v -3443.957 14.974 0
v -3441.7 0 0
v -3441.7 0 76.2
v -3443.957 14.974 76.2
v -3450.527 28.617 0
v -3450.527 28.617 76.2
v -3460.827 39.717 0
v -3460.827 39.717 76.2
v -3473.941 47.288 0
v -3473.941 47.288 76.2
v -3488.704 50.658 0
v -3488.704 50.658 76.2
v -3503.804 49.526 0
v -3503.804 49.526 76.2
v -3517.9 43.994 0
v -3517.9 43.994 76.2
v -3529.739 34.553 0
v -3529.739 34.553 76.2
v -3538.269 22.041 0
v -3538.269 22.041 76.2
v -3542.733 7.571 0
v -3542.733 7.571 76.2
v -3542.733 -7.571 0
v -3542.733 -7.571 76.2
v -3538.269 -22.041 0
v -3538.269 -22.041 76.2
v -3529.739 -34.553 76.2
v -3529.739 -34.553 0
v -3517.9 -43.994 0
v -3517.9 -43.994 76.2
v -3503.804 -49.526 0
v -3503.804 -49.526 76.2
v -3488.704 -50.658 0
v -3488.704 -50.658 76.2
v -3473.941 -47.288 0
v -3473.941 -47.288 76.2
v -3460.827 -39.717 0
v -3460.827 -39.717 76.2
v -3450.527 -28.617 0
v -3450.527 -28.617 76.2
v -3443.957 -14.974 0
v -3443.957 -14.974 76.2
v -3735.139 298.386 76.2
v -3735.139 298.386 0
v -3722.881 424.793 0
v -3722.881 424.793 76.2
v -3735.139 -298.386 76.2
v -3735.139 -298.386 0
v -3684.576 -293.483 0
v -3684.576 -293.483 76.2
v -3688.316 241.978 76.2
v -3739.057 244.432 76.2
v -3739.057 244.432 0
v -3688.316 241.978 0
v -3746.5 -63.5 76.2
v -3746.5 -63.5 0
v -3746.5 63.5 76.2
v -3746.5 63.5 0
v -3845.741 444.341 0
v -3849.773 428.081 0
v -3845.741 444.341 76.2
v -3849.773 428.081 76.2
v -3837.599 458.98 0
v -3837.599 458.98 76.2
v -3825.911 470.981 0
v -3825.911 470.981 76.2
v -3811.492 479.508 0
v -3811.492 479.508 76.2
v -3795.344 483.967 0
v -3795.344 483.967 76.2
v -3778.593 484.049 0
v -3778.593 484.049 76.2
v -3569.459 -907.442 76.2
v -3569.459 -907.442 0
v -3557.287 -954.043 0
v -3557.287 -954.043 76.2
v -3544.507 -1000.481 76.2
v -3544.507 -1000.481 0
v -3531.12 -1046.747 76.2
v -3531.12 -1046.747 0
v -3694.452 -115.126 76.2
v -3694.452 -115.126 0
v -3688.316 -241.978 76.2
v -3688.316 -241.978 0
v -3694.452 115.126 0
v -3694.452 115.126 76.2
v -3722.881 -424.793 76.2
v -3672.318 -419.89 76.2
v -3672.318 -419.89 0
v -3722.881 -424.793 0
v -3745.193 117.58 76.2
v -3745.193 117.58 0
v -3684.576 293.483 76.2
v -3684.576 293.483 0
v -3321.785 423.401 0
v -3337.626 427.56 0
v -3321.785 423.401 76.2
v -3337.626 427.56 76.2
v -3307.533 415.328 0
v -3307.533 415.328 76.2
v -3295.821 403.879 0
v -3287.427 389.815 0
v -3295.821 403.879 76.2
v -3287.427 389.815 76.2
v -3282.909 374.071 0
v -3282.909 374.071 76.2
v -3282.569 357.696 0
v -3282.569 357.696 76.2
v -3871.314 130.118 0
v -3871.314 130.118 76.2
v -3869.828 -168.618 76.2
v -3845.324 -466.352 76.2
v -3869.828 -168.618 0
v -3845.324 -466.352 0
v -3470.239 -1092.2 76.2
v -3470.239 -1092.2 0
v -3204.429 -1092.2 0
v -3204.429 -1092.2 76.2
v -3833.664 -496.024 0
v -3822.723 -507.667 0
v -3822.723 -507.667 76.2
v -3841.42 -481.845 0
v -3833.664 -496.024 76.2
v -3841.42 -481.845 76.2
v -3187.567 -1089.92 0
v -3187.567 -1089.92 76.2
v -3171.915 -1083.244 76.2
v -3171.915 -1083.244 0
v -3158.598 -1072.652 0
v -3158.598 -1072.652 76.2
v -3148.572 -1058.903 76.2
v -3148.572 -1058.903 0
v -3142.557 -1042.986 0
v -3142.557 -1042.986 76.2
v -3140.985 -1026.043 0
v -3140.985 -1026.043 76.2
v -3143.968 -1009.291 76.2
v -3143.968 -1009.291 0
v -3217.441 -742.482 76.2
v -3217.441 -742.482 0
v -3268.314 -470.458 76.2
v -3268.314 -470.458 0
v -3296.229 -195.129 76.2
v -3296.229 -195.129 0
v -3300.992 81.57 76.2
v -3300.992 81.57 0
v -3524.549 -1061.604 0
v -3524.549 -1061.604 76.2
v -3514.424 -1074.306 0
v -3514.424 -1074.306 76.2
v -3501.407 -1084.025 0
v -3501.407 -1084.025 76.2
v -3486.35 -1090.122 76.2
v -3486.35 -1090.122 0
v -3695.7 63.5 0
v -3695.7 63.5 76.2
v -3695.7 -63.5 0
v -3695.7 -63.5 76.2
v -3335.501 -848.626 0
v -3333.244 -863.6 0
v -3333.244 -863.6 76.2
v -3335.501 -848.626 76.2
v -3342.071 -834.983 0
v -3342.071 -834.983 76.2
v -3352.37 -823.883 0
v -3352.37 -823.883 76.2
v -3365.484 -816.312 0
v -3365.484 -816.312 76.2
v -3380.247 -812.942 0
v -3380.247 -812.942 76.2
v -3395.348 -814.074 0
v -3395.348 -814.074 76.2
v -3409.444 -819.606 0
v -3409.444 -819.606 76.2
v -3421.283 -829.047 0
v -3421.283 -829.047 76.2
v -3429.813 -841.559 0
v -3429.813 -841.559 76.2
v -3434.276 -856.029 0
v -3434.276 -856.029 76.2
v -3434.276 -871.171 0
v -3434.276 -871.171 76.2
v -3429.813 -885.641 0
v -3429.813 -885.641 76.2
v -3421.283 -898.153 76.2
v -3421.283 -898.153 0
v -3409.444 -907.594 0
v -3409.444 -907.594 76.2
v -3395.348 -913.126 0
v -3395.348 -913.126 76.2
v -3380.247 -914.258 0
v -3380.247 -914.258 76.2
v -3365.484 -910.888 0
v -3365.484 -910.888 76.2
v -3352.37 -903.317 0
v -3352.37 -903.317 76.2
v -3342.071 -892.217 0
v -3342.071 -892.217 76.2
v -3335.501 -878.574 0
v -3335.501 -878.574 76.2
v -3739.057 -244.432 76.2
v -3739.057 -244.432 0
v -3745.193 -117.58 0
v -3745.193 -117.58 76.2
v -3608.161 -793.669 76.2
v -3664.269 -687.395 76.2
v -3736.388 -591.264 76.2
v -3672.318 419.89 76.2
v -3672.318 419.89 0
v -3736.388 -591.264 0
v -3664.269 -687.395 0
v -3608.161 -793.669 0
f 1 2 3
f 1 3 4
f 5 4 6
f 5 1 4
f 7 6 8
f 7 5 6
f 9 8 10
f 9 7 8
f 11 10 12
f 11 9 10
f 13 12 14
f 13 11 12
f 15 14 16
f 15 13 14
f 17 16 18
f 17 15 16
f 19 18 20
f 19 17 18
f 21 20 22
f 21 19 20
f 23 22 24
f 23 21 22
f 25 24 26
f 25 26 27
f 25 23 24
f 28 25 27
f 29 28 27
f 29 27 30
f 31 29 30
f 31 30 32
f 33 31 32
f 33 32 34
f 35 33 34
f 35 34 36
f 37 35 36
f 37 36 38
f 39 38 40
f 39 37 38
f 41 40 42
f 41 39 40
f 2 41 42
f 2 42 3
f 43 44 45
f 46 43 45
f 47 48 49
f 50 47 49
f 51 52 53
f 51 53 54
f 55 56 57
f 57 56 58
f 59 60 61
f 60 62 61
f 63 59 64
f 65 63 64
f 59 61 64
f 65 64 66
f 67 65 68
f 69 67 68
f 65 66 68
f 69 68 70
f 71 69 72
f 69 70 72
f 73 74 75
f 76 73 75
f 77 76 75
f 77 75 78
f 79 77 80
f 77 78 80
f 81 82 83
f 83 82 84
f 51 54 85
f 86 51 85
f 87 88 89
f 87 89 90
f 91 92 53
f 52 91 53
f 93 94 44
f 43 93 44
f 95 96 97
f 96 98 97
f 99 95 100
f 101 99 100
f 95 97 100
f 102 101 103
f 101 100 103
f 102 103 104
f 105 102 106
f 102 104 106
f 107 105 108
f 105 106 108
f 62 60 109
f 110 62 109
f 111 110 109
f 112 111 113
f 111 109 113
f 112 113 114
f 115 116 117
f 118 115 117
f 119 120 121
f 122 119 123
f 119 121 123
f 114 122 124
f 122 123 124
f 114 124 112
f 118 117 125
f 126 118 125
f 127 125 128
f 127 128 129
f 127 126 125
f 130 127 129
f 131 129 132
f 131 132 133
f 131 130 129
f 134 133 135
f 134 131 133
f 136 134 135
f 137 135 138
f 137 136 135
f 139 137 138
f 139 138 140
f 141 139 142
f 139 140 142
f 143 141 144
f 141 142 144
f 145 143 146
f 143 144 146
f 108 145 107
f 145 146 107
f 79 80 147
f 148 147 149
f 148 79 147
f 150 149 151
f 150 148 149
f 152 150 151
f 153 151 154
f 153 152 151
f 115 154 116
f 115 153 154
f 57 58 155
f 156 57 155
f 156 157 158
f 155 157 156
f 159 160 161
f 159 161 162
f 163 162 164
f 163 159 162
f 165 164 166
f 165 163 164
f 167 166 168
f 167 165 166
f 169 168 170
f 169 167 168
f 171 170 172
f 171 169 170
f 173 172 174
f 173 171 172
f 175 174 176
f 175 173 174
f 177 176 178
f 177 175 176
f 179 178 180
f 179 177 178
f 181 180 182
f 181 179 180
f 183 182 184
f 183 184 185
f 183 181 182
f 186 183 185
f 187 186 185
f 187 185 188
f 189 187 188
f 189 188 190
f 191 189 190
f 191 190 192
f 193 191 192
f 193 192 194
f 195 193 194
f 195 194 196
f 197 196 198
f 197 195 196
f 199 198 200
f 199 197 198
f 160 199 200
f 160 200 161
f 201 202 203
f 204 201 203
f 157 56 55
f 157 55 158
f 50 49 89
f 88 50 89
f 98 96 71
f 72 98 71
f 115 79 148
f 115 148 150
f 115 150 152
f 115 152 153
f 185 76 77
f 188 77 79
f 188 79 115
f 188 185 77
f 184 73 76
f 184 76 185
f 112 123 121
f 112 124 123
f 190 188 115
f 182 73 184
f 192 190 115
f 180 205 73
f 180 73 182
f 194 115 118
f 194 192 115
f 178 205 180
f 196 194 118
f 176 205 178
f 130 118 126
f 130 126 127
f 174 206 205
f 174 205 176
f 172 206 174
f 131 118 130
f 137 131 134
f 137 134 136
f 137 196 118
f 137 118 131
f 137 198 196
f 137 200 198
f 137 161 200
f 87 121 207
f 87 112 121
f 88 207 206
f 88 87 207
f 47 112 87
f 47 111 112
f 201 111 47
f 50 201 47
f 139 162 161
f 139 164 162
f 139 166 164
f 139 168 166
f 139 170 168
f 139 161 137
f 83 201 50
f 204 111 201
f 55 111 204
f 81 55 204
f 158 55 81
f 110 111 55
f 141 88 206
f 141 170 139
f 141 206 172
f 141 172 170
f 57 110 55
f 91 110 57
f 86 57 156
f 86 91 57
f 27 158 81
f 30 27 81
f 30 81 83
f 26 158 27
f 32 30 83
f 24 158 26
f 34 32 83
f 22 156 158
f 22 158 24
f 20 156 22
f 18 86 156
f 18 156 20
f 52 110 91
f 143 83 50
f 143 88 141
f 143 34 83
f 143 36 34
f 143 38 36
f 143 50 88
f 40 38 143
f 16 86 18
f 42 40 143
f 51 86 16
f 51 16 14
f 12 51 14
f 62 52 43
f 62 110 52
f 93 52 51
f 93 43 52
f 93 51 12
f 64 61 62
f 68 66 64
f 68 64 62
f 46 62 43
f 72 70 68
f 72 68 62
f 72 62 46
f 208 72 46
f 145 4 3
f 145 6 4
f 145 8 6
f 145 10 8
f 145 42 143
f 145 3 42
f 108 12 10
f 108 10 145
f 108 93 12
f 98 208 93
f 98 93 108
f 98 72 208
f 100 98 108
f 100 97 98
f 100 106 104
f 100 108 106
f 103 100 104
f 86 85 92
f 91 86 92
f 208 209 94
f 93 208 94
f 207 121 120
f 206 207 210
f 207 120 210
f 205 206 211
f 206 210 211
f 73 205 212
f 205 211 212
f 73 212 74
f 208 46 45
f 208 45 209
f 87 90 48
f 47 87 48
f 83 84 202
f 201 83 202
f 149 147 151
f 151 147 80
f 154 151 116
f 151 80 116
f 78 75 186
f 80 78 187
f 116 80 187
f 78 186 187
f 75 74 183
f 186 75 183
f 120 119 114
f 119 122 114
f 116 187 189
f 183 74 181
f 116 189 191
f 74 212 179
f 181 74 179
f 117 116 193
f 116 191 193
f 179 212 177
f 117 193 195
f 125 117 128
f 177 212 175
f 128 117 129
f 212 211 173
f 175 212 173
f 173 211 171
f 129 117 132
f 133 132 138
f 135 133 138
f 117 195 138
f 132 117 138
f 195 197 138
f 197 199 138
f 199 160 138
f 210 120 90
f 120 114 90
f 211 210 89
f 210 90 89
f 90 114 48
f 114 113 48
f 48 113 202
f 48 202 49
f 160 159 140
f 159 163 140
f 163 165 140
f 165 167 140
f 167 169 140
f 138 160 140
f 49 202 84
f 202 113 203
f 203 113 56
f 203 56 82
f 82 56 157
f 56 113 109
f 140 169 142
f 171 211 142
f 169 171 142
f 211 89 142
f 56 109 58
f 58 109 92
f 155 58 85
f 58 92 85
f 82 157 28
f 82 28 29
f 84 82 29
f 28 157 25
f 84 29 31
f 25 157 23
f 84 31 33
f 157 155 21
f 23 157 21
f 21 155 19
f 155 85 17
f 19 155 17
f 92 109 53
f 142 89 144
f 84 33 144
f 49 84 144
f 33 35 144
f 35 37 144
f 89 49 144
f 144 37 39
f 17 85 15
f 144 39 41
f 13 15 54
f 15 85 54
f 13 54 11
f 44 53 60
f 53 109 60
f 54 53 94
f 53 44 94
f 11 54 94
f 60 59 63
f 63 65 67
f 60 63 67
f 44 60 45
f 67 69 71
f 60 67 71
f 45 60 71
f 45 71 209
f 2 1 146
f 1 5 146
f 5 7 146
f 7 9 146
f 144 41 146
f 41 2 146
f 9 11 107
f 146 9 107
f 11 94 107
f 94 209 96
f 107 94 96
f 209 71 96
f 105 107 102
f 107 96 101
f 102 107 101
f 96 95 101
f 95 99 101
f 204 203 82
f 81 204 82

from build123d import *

# Parameters (mm, degrees)
F0_W        = 50.8
F0_H        = 127
F0_R        = 50.8
F1_DEPTH    = 76.2
F2_T1_DEPTH = 76.2
F3_R        = 63.5


# Not quite as in the source:
# - a fillet or chamfer that OpenCascade refuses, or shapes differently, is made with other operations: its cross-section is extruded or revolved along the edge and cut away or added
# - a feature names something its author has since deleted; it is built from what else it names


with BuildPart() as f1:
    # F0 (on Top) → F1 (new body)
    with BuildSketch(Plane.XY):
        with BuildLine():
            Line((-3842.1031233725, -492.1847614173), (-3653.1472320591, -467.9789534788))
            ThreePointArc((-3653.1472320591, -467.9789534788), (-3683, 0), (-3653.1472320591, 467.9789534788))
            Line((-3653.1472320591, 467.9789534788), (-3842.1031233725, 492.1847614173))
            ThreePointArc((-3842.1031233725, 492.1847614173), (-3873.5, 0), (-3842.1031233725, -492.1847614173))
        make_face()
        Polygon((-3672.3184884479, -419.8900563283), (-3722.8813354916, -424.7929635108), (-3735.1386034477, -298.3858459017), (-3684.5757564041, -293.4829387192), align=None, mode=Mode.SUBTRACT)
        Polygon((-3688.3163611044, -241.9776031163), (-3739.0570382274, -244.4319227962), (-3745.1928374272, -117.5802299885), (-3694.4521603041, -115.1259103086), align=None, mode=Mode.SUBTRACT)
        with Locations((-3721.1, 0)):
            Rectangle(F0_W, F0_H, mode=Mode.SUBTRACT)
        Polygon((-3694.4521603041, 115.1259103086), (-3745.1928374272, 117.5802299885), (-3739.0570382274, 244.4319227962), (-3688.3163611044, 241.9776031163), align=None, mode=Mode.SUBTRACT)
        Polygon((-3684.5757564041, 293.4829387192), (-3735.1386034477, 298.3858459017), (-3722.8813354916, 424.7929635108), (-3672.3184884479, 419.8900563283), align=None, mode=Mode.SUBTRACT)
        with BuildLine():
            Line((-3653.1472320591, -467.9789534788), (-3275.2354494323, -419.5673376017))
            ThreePointArc((-3275.2354494323, -419.5673376016), (-3302, 0), (-3275.2354494323, 419.5673376016))
            Line((-3275.2354494323, 419.5673376017), (-3653.1472320591, 467.9789534788))
            ThreePointArc((-3653.1472320591, 467.9789534788), (-3683, 0), (-3653.1472320591, -467.9789534788))
        make_face()
        with Locations((-3492.5, 0)):
            Circle(F0_R, mode=Mode.SUBTRACT)
        with BuildLine():
            Line((-3627.8456416998, -635), (-3240.367108832, -635))
            ThreePointArc((-3240.367108832, -635), (-3259.5815655268, -527.5718128161), (-3275.2354494323, -419.5673376016))
            Line((-3275.2354494323, -419.5673376017), (-3653.1472320591, -467.9789534788))
            ThreePointArc((-3653.1472320591, -467.9789534788), (-3641.4541483351, -551.6345579938), (-3627.8456416998, -635))
        make_face()
        with BuildLine():
            Line((-3517.3268486167, -1092.2), (-3116.1359341338, -1092.2))
            ThreePointArc((-3116.1359341338, -1092.2000000001), (-3186.4620967161, -865.8309917021), (-3240.367108832, -635))
            Line((-3240.367108832, -635), (-3627.8456416998, -635))
            ThreePointArc((-3627.8456416998, -635), (-3579.8925178131, -865.3661426853), (-3517.3268486167, -1092.1999999999))
        make_face()
        with Locations((-3384.0436300379, -863.6)):
            Circle(F0_R, mode=Mode.SUBTRACT)
    extrude(amount=F1_DEPTH)

    # F2: fillet of radius 762 on 1 edges, made by hand

    # F2_s2 → F2_t1 (join)
    with BuildSketch(Plane.XY):
        with BuildLine():
            ThreePointArc((-3842.1031233725, -492.1847614173), (-3670.9916584142, -676.9720156234), (-3569.4589749529, -907.4423541626))
            Line((-3569.4589749529, -907.4423541626), (-3554.6887998841, -903.6874202833))
            ThreePointArc((-3554.6887998841, -903.6874202833), (-3603.0108161093, -686.1315301017), (-3638.030760754, -466.0424888437))
            Line((-3638.030760754, -466.0424888437), (-3655.0836966942, -452.8624821737))
            ThreePointArc((-3655.0836966942, -452.8624821737), (-3749.5616423509, -464.965386143), (-3832.7858312721, -480.1246756831))
            Line((-3832.7858312721, -480.1246756831), (-3842.1031233725, -492.1847614173))
        make_face()
    extrude(amount=F2_T1_DEPTH)

    # F3
    f3_edges = [f1.edges().sort_by_distance(p)[0] for p in [
        (-3842.103123, -492.184761, 38.1),
        (-3842.103123, 492.184761, 38.1),
        (-3275.235449, 419.567338, 38.1),
        (-3116.135934, -1092.2, 38.1),
        (-3517.326849, -1092.2, 38.1),
    ]]
    fillet(f3_edges, radius=F3_R)


solid = f1.part
